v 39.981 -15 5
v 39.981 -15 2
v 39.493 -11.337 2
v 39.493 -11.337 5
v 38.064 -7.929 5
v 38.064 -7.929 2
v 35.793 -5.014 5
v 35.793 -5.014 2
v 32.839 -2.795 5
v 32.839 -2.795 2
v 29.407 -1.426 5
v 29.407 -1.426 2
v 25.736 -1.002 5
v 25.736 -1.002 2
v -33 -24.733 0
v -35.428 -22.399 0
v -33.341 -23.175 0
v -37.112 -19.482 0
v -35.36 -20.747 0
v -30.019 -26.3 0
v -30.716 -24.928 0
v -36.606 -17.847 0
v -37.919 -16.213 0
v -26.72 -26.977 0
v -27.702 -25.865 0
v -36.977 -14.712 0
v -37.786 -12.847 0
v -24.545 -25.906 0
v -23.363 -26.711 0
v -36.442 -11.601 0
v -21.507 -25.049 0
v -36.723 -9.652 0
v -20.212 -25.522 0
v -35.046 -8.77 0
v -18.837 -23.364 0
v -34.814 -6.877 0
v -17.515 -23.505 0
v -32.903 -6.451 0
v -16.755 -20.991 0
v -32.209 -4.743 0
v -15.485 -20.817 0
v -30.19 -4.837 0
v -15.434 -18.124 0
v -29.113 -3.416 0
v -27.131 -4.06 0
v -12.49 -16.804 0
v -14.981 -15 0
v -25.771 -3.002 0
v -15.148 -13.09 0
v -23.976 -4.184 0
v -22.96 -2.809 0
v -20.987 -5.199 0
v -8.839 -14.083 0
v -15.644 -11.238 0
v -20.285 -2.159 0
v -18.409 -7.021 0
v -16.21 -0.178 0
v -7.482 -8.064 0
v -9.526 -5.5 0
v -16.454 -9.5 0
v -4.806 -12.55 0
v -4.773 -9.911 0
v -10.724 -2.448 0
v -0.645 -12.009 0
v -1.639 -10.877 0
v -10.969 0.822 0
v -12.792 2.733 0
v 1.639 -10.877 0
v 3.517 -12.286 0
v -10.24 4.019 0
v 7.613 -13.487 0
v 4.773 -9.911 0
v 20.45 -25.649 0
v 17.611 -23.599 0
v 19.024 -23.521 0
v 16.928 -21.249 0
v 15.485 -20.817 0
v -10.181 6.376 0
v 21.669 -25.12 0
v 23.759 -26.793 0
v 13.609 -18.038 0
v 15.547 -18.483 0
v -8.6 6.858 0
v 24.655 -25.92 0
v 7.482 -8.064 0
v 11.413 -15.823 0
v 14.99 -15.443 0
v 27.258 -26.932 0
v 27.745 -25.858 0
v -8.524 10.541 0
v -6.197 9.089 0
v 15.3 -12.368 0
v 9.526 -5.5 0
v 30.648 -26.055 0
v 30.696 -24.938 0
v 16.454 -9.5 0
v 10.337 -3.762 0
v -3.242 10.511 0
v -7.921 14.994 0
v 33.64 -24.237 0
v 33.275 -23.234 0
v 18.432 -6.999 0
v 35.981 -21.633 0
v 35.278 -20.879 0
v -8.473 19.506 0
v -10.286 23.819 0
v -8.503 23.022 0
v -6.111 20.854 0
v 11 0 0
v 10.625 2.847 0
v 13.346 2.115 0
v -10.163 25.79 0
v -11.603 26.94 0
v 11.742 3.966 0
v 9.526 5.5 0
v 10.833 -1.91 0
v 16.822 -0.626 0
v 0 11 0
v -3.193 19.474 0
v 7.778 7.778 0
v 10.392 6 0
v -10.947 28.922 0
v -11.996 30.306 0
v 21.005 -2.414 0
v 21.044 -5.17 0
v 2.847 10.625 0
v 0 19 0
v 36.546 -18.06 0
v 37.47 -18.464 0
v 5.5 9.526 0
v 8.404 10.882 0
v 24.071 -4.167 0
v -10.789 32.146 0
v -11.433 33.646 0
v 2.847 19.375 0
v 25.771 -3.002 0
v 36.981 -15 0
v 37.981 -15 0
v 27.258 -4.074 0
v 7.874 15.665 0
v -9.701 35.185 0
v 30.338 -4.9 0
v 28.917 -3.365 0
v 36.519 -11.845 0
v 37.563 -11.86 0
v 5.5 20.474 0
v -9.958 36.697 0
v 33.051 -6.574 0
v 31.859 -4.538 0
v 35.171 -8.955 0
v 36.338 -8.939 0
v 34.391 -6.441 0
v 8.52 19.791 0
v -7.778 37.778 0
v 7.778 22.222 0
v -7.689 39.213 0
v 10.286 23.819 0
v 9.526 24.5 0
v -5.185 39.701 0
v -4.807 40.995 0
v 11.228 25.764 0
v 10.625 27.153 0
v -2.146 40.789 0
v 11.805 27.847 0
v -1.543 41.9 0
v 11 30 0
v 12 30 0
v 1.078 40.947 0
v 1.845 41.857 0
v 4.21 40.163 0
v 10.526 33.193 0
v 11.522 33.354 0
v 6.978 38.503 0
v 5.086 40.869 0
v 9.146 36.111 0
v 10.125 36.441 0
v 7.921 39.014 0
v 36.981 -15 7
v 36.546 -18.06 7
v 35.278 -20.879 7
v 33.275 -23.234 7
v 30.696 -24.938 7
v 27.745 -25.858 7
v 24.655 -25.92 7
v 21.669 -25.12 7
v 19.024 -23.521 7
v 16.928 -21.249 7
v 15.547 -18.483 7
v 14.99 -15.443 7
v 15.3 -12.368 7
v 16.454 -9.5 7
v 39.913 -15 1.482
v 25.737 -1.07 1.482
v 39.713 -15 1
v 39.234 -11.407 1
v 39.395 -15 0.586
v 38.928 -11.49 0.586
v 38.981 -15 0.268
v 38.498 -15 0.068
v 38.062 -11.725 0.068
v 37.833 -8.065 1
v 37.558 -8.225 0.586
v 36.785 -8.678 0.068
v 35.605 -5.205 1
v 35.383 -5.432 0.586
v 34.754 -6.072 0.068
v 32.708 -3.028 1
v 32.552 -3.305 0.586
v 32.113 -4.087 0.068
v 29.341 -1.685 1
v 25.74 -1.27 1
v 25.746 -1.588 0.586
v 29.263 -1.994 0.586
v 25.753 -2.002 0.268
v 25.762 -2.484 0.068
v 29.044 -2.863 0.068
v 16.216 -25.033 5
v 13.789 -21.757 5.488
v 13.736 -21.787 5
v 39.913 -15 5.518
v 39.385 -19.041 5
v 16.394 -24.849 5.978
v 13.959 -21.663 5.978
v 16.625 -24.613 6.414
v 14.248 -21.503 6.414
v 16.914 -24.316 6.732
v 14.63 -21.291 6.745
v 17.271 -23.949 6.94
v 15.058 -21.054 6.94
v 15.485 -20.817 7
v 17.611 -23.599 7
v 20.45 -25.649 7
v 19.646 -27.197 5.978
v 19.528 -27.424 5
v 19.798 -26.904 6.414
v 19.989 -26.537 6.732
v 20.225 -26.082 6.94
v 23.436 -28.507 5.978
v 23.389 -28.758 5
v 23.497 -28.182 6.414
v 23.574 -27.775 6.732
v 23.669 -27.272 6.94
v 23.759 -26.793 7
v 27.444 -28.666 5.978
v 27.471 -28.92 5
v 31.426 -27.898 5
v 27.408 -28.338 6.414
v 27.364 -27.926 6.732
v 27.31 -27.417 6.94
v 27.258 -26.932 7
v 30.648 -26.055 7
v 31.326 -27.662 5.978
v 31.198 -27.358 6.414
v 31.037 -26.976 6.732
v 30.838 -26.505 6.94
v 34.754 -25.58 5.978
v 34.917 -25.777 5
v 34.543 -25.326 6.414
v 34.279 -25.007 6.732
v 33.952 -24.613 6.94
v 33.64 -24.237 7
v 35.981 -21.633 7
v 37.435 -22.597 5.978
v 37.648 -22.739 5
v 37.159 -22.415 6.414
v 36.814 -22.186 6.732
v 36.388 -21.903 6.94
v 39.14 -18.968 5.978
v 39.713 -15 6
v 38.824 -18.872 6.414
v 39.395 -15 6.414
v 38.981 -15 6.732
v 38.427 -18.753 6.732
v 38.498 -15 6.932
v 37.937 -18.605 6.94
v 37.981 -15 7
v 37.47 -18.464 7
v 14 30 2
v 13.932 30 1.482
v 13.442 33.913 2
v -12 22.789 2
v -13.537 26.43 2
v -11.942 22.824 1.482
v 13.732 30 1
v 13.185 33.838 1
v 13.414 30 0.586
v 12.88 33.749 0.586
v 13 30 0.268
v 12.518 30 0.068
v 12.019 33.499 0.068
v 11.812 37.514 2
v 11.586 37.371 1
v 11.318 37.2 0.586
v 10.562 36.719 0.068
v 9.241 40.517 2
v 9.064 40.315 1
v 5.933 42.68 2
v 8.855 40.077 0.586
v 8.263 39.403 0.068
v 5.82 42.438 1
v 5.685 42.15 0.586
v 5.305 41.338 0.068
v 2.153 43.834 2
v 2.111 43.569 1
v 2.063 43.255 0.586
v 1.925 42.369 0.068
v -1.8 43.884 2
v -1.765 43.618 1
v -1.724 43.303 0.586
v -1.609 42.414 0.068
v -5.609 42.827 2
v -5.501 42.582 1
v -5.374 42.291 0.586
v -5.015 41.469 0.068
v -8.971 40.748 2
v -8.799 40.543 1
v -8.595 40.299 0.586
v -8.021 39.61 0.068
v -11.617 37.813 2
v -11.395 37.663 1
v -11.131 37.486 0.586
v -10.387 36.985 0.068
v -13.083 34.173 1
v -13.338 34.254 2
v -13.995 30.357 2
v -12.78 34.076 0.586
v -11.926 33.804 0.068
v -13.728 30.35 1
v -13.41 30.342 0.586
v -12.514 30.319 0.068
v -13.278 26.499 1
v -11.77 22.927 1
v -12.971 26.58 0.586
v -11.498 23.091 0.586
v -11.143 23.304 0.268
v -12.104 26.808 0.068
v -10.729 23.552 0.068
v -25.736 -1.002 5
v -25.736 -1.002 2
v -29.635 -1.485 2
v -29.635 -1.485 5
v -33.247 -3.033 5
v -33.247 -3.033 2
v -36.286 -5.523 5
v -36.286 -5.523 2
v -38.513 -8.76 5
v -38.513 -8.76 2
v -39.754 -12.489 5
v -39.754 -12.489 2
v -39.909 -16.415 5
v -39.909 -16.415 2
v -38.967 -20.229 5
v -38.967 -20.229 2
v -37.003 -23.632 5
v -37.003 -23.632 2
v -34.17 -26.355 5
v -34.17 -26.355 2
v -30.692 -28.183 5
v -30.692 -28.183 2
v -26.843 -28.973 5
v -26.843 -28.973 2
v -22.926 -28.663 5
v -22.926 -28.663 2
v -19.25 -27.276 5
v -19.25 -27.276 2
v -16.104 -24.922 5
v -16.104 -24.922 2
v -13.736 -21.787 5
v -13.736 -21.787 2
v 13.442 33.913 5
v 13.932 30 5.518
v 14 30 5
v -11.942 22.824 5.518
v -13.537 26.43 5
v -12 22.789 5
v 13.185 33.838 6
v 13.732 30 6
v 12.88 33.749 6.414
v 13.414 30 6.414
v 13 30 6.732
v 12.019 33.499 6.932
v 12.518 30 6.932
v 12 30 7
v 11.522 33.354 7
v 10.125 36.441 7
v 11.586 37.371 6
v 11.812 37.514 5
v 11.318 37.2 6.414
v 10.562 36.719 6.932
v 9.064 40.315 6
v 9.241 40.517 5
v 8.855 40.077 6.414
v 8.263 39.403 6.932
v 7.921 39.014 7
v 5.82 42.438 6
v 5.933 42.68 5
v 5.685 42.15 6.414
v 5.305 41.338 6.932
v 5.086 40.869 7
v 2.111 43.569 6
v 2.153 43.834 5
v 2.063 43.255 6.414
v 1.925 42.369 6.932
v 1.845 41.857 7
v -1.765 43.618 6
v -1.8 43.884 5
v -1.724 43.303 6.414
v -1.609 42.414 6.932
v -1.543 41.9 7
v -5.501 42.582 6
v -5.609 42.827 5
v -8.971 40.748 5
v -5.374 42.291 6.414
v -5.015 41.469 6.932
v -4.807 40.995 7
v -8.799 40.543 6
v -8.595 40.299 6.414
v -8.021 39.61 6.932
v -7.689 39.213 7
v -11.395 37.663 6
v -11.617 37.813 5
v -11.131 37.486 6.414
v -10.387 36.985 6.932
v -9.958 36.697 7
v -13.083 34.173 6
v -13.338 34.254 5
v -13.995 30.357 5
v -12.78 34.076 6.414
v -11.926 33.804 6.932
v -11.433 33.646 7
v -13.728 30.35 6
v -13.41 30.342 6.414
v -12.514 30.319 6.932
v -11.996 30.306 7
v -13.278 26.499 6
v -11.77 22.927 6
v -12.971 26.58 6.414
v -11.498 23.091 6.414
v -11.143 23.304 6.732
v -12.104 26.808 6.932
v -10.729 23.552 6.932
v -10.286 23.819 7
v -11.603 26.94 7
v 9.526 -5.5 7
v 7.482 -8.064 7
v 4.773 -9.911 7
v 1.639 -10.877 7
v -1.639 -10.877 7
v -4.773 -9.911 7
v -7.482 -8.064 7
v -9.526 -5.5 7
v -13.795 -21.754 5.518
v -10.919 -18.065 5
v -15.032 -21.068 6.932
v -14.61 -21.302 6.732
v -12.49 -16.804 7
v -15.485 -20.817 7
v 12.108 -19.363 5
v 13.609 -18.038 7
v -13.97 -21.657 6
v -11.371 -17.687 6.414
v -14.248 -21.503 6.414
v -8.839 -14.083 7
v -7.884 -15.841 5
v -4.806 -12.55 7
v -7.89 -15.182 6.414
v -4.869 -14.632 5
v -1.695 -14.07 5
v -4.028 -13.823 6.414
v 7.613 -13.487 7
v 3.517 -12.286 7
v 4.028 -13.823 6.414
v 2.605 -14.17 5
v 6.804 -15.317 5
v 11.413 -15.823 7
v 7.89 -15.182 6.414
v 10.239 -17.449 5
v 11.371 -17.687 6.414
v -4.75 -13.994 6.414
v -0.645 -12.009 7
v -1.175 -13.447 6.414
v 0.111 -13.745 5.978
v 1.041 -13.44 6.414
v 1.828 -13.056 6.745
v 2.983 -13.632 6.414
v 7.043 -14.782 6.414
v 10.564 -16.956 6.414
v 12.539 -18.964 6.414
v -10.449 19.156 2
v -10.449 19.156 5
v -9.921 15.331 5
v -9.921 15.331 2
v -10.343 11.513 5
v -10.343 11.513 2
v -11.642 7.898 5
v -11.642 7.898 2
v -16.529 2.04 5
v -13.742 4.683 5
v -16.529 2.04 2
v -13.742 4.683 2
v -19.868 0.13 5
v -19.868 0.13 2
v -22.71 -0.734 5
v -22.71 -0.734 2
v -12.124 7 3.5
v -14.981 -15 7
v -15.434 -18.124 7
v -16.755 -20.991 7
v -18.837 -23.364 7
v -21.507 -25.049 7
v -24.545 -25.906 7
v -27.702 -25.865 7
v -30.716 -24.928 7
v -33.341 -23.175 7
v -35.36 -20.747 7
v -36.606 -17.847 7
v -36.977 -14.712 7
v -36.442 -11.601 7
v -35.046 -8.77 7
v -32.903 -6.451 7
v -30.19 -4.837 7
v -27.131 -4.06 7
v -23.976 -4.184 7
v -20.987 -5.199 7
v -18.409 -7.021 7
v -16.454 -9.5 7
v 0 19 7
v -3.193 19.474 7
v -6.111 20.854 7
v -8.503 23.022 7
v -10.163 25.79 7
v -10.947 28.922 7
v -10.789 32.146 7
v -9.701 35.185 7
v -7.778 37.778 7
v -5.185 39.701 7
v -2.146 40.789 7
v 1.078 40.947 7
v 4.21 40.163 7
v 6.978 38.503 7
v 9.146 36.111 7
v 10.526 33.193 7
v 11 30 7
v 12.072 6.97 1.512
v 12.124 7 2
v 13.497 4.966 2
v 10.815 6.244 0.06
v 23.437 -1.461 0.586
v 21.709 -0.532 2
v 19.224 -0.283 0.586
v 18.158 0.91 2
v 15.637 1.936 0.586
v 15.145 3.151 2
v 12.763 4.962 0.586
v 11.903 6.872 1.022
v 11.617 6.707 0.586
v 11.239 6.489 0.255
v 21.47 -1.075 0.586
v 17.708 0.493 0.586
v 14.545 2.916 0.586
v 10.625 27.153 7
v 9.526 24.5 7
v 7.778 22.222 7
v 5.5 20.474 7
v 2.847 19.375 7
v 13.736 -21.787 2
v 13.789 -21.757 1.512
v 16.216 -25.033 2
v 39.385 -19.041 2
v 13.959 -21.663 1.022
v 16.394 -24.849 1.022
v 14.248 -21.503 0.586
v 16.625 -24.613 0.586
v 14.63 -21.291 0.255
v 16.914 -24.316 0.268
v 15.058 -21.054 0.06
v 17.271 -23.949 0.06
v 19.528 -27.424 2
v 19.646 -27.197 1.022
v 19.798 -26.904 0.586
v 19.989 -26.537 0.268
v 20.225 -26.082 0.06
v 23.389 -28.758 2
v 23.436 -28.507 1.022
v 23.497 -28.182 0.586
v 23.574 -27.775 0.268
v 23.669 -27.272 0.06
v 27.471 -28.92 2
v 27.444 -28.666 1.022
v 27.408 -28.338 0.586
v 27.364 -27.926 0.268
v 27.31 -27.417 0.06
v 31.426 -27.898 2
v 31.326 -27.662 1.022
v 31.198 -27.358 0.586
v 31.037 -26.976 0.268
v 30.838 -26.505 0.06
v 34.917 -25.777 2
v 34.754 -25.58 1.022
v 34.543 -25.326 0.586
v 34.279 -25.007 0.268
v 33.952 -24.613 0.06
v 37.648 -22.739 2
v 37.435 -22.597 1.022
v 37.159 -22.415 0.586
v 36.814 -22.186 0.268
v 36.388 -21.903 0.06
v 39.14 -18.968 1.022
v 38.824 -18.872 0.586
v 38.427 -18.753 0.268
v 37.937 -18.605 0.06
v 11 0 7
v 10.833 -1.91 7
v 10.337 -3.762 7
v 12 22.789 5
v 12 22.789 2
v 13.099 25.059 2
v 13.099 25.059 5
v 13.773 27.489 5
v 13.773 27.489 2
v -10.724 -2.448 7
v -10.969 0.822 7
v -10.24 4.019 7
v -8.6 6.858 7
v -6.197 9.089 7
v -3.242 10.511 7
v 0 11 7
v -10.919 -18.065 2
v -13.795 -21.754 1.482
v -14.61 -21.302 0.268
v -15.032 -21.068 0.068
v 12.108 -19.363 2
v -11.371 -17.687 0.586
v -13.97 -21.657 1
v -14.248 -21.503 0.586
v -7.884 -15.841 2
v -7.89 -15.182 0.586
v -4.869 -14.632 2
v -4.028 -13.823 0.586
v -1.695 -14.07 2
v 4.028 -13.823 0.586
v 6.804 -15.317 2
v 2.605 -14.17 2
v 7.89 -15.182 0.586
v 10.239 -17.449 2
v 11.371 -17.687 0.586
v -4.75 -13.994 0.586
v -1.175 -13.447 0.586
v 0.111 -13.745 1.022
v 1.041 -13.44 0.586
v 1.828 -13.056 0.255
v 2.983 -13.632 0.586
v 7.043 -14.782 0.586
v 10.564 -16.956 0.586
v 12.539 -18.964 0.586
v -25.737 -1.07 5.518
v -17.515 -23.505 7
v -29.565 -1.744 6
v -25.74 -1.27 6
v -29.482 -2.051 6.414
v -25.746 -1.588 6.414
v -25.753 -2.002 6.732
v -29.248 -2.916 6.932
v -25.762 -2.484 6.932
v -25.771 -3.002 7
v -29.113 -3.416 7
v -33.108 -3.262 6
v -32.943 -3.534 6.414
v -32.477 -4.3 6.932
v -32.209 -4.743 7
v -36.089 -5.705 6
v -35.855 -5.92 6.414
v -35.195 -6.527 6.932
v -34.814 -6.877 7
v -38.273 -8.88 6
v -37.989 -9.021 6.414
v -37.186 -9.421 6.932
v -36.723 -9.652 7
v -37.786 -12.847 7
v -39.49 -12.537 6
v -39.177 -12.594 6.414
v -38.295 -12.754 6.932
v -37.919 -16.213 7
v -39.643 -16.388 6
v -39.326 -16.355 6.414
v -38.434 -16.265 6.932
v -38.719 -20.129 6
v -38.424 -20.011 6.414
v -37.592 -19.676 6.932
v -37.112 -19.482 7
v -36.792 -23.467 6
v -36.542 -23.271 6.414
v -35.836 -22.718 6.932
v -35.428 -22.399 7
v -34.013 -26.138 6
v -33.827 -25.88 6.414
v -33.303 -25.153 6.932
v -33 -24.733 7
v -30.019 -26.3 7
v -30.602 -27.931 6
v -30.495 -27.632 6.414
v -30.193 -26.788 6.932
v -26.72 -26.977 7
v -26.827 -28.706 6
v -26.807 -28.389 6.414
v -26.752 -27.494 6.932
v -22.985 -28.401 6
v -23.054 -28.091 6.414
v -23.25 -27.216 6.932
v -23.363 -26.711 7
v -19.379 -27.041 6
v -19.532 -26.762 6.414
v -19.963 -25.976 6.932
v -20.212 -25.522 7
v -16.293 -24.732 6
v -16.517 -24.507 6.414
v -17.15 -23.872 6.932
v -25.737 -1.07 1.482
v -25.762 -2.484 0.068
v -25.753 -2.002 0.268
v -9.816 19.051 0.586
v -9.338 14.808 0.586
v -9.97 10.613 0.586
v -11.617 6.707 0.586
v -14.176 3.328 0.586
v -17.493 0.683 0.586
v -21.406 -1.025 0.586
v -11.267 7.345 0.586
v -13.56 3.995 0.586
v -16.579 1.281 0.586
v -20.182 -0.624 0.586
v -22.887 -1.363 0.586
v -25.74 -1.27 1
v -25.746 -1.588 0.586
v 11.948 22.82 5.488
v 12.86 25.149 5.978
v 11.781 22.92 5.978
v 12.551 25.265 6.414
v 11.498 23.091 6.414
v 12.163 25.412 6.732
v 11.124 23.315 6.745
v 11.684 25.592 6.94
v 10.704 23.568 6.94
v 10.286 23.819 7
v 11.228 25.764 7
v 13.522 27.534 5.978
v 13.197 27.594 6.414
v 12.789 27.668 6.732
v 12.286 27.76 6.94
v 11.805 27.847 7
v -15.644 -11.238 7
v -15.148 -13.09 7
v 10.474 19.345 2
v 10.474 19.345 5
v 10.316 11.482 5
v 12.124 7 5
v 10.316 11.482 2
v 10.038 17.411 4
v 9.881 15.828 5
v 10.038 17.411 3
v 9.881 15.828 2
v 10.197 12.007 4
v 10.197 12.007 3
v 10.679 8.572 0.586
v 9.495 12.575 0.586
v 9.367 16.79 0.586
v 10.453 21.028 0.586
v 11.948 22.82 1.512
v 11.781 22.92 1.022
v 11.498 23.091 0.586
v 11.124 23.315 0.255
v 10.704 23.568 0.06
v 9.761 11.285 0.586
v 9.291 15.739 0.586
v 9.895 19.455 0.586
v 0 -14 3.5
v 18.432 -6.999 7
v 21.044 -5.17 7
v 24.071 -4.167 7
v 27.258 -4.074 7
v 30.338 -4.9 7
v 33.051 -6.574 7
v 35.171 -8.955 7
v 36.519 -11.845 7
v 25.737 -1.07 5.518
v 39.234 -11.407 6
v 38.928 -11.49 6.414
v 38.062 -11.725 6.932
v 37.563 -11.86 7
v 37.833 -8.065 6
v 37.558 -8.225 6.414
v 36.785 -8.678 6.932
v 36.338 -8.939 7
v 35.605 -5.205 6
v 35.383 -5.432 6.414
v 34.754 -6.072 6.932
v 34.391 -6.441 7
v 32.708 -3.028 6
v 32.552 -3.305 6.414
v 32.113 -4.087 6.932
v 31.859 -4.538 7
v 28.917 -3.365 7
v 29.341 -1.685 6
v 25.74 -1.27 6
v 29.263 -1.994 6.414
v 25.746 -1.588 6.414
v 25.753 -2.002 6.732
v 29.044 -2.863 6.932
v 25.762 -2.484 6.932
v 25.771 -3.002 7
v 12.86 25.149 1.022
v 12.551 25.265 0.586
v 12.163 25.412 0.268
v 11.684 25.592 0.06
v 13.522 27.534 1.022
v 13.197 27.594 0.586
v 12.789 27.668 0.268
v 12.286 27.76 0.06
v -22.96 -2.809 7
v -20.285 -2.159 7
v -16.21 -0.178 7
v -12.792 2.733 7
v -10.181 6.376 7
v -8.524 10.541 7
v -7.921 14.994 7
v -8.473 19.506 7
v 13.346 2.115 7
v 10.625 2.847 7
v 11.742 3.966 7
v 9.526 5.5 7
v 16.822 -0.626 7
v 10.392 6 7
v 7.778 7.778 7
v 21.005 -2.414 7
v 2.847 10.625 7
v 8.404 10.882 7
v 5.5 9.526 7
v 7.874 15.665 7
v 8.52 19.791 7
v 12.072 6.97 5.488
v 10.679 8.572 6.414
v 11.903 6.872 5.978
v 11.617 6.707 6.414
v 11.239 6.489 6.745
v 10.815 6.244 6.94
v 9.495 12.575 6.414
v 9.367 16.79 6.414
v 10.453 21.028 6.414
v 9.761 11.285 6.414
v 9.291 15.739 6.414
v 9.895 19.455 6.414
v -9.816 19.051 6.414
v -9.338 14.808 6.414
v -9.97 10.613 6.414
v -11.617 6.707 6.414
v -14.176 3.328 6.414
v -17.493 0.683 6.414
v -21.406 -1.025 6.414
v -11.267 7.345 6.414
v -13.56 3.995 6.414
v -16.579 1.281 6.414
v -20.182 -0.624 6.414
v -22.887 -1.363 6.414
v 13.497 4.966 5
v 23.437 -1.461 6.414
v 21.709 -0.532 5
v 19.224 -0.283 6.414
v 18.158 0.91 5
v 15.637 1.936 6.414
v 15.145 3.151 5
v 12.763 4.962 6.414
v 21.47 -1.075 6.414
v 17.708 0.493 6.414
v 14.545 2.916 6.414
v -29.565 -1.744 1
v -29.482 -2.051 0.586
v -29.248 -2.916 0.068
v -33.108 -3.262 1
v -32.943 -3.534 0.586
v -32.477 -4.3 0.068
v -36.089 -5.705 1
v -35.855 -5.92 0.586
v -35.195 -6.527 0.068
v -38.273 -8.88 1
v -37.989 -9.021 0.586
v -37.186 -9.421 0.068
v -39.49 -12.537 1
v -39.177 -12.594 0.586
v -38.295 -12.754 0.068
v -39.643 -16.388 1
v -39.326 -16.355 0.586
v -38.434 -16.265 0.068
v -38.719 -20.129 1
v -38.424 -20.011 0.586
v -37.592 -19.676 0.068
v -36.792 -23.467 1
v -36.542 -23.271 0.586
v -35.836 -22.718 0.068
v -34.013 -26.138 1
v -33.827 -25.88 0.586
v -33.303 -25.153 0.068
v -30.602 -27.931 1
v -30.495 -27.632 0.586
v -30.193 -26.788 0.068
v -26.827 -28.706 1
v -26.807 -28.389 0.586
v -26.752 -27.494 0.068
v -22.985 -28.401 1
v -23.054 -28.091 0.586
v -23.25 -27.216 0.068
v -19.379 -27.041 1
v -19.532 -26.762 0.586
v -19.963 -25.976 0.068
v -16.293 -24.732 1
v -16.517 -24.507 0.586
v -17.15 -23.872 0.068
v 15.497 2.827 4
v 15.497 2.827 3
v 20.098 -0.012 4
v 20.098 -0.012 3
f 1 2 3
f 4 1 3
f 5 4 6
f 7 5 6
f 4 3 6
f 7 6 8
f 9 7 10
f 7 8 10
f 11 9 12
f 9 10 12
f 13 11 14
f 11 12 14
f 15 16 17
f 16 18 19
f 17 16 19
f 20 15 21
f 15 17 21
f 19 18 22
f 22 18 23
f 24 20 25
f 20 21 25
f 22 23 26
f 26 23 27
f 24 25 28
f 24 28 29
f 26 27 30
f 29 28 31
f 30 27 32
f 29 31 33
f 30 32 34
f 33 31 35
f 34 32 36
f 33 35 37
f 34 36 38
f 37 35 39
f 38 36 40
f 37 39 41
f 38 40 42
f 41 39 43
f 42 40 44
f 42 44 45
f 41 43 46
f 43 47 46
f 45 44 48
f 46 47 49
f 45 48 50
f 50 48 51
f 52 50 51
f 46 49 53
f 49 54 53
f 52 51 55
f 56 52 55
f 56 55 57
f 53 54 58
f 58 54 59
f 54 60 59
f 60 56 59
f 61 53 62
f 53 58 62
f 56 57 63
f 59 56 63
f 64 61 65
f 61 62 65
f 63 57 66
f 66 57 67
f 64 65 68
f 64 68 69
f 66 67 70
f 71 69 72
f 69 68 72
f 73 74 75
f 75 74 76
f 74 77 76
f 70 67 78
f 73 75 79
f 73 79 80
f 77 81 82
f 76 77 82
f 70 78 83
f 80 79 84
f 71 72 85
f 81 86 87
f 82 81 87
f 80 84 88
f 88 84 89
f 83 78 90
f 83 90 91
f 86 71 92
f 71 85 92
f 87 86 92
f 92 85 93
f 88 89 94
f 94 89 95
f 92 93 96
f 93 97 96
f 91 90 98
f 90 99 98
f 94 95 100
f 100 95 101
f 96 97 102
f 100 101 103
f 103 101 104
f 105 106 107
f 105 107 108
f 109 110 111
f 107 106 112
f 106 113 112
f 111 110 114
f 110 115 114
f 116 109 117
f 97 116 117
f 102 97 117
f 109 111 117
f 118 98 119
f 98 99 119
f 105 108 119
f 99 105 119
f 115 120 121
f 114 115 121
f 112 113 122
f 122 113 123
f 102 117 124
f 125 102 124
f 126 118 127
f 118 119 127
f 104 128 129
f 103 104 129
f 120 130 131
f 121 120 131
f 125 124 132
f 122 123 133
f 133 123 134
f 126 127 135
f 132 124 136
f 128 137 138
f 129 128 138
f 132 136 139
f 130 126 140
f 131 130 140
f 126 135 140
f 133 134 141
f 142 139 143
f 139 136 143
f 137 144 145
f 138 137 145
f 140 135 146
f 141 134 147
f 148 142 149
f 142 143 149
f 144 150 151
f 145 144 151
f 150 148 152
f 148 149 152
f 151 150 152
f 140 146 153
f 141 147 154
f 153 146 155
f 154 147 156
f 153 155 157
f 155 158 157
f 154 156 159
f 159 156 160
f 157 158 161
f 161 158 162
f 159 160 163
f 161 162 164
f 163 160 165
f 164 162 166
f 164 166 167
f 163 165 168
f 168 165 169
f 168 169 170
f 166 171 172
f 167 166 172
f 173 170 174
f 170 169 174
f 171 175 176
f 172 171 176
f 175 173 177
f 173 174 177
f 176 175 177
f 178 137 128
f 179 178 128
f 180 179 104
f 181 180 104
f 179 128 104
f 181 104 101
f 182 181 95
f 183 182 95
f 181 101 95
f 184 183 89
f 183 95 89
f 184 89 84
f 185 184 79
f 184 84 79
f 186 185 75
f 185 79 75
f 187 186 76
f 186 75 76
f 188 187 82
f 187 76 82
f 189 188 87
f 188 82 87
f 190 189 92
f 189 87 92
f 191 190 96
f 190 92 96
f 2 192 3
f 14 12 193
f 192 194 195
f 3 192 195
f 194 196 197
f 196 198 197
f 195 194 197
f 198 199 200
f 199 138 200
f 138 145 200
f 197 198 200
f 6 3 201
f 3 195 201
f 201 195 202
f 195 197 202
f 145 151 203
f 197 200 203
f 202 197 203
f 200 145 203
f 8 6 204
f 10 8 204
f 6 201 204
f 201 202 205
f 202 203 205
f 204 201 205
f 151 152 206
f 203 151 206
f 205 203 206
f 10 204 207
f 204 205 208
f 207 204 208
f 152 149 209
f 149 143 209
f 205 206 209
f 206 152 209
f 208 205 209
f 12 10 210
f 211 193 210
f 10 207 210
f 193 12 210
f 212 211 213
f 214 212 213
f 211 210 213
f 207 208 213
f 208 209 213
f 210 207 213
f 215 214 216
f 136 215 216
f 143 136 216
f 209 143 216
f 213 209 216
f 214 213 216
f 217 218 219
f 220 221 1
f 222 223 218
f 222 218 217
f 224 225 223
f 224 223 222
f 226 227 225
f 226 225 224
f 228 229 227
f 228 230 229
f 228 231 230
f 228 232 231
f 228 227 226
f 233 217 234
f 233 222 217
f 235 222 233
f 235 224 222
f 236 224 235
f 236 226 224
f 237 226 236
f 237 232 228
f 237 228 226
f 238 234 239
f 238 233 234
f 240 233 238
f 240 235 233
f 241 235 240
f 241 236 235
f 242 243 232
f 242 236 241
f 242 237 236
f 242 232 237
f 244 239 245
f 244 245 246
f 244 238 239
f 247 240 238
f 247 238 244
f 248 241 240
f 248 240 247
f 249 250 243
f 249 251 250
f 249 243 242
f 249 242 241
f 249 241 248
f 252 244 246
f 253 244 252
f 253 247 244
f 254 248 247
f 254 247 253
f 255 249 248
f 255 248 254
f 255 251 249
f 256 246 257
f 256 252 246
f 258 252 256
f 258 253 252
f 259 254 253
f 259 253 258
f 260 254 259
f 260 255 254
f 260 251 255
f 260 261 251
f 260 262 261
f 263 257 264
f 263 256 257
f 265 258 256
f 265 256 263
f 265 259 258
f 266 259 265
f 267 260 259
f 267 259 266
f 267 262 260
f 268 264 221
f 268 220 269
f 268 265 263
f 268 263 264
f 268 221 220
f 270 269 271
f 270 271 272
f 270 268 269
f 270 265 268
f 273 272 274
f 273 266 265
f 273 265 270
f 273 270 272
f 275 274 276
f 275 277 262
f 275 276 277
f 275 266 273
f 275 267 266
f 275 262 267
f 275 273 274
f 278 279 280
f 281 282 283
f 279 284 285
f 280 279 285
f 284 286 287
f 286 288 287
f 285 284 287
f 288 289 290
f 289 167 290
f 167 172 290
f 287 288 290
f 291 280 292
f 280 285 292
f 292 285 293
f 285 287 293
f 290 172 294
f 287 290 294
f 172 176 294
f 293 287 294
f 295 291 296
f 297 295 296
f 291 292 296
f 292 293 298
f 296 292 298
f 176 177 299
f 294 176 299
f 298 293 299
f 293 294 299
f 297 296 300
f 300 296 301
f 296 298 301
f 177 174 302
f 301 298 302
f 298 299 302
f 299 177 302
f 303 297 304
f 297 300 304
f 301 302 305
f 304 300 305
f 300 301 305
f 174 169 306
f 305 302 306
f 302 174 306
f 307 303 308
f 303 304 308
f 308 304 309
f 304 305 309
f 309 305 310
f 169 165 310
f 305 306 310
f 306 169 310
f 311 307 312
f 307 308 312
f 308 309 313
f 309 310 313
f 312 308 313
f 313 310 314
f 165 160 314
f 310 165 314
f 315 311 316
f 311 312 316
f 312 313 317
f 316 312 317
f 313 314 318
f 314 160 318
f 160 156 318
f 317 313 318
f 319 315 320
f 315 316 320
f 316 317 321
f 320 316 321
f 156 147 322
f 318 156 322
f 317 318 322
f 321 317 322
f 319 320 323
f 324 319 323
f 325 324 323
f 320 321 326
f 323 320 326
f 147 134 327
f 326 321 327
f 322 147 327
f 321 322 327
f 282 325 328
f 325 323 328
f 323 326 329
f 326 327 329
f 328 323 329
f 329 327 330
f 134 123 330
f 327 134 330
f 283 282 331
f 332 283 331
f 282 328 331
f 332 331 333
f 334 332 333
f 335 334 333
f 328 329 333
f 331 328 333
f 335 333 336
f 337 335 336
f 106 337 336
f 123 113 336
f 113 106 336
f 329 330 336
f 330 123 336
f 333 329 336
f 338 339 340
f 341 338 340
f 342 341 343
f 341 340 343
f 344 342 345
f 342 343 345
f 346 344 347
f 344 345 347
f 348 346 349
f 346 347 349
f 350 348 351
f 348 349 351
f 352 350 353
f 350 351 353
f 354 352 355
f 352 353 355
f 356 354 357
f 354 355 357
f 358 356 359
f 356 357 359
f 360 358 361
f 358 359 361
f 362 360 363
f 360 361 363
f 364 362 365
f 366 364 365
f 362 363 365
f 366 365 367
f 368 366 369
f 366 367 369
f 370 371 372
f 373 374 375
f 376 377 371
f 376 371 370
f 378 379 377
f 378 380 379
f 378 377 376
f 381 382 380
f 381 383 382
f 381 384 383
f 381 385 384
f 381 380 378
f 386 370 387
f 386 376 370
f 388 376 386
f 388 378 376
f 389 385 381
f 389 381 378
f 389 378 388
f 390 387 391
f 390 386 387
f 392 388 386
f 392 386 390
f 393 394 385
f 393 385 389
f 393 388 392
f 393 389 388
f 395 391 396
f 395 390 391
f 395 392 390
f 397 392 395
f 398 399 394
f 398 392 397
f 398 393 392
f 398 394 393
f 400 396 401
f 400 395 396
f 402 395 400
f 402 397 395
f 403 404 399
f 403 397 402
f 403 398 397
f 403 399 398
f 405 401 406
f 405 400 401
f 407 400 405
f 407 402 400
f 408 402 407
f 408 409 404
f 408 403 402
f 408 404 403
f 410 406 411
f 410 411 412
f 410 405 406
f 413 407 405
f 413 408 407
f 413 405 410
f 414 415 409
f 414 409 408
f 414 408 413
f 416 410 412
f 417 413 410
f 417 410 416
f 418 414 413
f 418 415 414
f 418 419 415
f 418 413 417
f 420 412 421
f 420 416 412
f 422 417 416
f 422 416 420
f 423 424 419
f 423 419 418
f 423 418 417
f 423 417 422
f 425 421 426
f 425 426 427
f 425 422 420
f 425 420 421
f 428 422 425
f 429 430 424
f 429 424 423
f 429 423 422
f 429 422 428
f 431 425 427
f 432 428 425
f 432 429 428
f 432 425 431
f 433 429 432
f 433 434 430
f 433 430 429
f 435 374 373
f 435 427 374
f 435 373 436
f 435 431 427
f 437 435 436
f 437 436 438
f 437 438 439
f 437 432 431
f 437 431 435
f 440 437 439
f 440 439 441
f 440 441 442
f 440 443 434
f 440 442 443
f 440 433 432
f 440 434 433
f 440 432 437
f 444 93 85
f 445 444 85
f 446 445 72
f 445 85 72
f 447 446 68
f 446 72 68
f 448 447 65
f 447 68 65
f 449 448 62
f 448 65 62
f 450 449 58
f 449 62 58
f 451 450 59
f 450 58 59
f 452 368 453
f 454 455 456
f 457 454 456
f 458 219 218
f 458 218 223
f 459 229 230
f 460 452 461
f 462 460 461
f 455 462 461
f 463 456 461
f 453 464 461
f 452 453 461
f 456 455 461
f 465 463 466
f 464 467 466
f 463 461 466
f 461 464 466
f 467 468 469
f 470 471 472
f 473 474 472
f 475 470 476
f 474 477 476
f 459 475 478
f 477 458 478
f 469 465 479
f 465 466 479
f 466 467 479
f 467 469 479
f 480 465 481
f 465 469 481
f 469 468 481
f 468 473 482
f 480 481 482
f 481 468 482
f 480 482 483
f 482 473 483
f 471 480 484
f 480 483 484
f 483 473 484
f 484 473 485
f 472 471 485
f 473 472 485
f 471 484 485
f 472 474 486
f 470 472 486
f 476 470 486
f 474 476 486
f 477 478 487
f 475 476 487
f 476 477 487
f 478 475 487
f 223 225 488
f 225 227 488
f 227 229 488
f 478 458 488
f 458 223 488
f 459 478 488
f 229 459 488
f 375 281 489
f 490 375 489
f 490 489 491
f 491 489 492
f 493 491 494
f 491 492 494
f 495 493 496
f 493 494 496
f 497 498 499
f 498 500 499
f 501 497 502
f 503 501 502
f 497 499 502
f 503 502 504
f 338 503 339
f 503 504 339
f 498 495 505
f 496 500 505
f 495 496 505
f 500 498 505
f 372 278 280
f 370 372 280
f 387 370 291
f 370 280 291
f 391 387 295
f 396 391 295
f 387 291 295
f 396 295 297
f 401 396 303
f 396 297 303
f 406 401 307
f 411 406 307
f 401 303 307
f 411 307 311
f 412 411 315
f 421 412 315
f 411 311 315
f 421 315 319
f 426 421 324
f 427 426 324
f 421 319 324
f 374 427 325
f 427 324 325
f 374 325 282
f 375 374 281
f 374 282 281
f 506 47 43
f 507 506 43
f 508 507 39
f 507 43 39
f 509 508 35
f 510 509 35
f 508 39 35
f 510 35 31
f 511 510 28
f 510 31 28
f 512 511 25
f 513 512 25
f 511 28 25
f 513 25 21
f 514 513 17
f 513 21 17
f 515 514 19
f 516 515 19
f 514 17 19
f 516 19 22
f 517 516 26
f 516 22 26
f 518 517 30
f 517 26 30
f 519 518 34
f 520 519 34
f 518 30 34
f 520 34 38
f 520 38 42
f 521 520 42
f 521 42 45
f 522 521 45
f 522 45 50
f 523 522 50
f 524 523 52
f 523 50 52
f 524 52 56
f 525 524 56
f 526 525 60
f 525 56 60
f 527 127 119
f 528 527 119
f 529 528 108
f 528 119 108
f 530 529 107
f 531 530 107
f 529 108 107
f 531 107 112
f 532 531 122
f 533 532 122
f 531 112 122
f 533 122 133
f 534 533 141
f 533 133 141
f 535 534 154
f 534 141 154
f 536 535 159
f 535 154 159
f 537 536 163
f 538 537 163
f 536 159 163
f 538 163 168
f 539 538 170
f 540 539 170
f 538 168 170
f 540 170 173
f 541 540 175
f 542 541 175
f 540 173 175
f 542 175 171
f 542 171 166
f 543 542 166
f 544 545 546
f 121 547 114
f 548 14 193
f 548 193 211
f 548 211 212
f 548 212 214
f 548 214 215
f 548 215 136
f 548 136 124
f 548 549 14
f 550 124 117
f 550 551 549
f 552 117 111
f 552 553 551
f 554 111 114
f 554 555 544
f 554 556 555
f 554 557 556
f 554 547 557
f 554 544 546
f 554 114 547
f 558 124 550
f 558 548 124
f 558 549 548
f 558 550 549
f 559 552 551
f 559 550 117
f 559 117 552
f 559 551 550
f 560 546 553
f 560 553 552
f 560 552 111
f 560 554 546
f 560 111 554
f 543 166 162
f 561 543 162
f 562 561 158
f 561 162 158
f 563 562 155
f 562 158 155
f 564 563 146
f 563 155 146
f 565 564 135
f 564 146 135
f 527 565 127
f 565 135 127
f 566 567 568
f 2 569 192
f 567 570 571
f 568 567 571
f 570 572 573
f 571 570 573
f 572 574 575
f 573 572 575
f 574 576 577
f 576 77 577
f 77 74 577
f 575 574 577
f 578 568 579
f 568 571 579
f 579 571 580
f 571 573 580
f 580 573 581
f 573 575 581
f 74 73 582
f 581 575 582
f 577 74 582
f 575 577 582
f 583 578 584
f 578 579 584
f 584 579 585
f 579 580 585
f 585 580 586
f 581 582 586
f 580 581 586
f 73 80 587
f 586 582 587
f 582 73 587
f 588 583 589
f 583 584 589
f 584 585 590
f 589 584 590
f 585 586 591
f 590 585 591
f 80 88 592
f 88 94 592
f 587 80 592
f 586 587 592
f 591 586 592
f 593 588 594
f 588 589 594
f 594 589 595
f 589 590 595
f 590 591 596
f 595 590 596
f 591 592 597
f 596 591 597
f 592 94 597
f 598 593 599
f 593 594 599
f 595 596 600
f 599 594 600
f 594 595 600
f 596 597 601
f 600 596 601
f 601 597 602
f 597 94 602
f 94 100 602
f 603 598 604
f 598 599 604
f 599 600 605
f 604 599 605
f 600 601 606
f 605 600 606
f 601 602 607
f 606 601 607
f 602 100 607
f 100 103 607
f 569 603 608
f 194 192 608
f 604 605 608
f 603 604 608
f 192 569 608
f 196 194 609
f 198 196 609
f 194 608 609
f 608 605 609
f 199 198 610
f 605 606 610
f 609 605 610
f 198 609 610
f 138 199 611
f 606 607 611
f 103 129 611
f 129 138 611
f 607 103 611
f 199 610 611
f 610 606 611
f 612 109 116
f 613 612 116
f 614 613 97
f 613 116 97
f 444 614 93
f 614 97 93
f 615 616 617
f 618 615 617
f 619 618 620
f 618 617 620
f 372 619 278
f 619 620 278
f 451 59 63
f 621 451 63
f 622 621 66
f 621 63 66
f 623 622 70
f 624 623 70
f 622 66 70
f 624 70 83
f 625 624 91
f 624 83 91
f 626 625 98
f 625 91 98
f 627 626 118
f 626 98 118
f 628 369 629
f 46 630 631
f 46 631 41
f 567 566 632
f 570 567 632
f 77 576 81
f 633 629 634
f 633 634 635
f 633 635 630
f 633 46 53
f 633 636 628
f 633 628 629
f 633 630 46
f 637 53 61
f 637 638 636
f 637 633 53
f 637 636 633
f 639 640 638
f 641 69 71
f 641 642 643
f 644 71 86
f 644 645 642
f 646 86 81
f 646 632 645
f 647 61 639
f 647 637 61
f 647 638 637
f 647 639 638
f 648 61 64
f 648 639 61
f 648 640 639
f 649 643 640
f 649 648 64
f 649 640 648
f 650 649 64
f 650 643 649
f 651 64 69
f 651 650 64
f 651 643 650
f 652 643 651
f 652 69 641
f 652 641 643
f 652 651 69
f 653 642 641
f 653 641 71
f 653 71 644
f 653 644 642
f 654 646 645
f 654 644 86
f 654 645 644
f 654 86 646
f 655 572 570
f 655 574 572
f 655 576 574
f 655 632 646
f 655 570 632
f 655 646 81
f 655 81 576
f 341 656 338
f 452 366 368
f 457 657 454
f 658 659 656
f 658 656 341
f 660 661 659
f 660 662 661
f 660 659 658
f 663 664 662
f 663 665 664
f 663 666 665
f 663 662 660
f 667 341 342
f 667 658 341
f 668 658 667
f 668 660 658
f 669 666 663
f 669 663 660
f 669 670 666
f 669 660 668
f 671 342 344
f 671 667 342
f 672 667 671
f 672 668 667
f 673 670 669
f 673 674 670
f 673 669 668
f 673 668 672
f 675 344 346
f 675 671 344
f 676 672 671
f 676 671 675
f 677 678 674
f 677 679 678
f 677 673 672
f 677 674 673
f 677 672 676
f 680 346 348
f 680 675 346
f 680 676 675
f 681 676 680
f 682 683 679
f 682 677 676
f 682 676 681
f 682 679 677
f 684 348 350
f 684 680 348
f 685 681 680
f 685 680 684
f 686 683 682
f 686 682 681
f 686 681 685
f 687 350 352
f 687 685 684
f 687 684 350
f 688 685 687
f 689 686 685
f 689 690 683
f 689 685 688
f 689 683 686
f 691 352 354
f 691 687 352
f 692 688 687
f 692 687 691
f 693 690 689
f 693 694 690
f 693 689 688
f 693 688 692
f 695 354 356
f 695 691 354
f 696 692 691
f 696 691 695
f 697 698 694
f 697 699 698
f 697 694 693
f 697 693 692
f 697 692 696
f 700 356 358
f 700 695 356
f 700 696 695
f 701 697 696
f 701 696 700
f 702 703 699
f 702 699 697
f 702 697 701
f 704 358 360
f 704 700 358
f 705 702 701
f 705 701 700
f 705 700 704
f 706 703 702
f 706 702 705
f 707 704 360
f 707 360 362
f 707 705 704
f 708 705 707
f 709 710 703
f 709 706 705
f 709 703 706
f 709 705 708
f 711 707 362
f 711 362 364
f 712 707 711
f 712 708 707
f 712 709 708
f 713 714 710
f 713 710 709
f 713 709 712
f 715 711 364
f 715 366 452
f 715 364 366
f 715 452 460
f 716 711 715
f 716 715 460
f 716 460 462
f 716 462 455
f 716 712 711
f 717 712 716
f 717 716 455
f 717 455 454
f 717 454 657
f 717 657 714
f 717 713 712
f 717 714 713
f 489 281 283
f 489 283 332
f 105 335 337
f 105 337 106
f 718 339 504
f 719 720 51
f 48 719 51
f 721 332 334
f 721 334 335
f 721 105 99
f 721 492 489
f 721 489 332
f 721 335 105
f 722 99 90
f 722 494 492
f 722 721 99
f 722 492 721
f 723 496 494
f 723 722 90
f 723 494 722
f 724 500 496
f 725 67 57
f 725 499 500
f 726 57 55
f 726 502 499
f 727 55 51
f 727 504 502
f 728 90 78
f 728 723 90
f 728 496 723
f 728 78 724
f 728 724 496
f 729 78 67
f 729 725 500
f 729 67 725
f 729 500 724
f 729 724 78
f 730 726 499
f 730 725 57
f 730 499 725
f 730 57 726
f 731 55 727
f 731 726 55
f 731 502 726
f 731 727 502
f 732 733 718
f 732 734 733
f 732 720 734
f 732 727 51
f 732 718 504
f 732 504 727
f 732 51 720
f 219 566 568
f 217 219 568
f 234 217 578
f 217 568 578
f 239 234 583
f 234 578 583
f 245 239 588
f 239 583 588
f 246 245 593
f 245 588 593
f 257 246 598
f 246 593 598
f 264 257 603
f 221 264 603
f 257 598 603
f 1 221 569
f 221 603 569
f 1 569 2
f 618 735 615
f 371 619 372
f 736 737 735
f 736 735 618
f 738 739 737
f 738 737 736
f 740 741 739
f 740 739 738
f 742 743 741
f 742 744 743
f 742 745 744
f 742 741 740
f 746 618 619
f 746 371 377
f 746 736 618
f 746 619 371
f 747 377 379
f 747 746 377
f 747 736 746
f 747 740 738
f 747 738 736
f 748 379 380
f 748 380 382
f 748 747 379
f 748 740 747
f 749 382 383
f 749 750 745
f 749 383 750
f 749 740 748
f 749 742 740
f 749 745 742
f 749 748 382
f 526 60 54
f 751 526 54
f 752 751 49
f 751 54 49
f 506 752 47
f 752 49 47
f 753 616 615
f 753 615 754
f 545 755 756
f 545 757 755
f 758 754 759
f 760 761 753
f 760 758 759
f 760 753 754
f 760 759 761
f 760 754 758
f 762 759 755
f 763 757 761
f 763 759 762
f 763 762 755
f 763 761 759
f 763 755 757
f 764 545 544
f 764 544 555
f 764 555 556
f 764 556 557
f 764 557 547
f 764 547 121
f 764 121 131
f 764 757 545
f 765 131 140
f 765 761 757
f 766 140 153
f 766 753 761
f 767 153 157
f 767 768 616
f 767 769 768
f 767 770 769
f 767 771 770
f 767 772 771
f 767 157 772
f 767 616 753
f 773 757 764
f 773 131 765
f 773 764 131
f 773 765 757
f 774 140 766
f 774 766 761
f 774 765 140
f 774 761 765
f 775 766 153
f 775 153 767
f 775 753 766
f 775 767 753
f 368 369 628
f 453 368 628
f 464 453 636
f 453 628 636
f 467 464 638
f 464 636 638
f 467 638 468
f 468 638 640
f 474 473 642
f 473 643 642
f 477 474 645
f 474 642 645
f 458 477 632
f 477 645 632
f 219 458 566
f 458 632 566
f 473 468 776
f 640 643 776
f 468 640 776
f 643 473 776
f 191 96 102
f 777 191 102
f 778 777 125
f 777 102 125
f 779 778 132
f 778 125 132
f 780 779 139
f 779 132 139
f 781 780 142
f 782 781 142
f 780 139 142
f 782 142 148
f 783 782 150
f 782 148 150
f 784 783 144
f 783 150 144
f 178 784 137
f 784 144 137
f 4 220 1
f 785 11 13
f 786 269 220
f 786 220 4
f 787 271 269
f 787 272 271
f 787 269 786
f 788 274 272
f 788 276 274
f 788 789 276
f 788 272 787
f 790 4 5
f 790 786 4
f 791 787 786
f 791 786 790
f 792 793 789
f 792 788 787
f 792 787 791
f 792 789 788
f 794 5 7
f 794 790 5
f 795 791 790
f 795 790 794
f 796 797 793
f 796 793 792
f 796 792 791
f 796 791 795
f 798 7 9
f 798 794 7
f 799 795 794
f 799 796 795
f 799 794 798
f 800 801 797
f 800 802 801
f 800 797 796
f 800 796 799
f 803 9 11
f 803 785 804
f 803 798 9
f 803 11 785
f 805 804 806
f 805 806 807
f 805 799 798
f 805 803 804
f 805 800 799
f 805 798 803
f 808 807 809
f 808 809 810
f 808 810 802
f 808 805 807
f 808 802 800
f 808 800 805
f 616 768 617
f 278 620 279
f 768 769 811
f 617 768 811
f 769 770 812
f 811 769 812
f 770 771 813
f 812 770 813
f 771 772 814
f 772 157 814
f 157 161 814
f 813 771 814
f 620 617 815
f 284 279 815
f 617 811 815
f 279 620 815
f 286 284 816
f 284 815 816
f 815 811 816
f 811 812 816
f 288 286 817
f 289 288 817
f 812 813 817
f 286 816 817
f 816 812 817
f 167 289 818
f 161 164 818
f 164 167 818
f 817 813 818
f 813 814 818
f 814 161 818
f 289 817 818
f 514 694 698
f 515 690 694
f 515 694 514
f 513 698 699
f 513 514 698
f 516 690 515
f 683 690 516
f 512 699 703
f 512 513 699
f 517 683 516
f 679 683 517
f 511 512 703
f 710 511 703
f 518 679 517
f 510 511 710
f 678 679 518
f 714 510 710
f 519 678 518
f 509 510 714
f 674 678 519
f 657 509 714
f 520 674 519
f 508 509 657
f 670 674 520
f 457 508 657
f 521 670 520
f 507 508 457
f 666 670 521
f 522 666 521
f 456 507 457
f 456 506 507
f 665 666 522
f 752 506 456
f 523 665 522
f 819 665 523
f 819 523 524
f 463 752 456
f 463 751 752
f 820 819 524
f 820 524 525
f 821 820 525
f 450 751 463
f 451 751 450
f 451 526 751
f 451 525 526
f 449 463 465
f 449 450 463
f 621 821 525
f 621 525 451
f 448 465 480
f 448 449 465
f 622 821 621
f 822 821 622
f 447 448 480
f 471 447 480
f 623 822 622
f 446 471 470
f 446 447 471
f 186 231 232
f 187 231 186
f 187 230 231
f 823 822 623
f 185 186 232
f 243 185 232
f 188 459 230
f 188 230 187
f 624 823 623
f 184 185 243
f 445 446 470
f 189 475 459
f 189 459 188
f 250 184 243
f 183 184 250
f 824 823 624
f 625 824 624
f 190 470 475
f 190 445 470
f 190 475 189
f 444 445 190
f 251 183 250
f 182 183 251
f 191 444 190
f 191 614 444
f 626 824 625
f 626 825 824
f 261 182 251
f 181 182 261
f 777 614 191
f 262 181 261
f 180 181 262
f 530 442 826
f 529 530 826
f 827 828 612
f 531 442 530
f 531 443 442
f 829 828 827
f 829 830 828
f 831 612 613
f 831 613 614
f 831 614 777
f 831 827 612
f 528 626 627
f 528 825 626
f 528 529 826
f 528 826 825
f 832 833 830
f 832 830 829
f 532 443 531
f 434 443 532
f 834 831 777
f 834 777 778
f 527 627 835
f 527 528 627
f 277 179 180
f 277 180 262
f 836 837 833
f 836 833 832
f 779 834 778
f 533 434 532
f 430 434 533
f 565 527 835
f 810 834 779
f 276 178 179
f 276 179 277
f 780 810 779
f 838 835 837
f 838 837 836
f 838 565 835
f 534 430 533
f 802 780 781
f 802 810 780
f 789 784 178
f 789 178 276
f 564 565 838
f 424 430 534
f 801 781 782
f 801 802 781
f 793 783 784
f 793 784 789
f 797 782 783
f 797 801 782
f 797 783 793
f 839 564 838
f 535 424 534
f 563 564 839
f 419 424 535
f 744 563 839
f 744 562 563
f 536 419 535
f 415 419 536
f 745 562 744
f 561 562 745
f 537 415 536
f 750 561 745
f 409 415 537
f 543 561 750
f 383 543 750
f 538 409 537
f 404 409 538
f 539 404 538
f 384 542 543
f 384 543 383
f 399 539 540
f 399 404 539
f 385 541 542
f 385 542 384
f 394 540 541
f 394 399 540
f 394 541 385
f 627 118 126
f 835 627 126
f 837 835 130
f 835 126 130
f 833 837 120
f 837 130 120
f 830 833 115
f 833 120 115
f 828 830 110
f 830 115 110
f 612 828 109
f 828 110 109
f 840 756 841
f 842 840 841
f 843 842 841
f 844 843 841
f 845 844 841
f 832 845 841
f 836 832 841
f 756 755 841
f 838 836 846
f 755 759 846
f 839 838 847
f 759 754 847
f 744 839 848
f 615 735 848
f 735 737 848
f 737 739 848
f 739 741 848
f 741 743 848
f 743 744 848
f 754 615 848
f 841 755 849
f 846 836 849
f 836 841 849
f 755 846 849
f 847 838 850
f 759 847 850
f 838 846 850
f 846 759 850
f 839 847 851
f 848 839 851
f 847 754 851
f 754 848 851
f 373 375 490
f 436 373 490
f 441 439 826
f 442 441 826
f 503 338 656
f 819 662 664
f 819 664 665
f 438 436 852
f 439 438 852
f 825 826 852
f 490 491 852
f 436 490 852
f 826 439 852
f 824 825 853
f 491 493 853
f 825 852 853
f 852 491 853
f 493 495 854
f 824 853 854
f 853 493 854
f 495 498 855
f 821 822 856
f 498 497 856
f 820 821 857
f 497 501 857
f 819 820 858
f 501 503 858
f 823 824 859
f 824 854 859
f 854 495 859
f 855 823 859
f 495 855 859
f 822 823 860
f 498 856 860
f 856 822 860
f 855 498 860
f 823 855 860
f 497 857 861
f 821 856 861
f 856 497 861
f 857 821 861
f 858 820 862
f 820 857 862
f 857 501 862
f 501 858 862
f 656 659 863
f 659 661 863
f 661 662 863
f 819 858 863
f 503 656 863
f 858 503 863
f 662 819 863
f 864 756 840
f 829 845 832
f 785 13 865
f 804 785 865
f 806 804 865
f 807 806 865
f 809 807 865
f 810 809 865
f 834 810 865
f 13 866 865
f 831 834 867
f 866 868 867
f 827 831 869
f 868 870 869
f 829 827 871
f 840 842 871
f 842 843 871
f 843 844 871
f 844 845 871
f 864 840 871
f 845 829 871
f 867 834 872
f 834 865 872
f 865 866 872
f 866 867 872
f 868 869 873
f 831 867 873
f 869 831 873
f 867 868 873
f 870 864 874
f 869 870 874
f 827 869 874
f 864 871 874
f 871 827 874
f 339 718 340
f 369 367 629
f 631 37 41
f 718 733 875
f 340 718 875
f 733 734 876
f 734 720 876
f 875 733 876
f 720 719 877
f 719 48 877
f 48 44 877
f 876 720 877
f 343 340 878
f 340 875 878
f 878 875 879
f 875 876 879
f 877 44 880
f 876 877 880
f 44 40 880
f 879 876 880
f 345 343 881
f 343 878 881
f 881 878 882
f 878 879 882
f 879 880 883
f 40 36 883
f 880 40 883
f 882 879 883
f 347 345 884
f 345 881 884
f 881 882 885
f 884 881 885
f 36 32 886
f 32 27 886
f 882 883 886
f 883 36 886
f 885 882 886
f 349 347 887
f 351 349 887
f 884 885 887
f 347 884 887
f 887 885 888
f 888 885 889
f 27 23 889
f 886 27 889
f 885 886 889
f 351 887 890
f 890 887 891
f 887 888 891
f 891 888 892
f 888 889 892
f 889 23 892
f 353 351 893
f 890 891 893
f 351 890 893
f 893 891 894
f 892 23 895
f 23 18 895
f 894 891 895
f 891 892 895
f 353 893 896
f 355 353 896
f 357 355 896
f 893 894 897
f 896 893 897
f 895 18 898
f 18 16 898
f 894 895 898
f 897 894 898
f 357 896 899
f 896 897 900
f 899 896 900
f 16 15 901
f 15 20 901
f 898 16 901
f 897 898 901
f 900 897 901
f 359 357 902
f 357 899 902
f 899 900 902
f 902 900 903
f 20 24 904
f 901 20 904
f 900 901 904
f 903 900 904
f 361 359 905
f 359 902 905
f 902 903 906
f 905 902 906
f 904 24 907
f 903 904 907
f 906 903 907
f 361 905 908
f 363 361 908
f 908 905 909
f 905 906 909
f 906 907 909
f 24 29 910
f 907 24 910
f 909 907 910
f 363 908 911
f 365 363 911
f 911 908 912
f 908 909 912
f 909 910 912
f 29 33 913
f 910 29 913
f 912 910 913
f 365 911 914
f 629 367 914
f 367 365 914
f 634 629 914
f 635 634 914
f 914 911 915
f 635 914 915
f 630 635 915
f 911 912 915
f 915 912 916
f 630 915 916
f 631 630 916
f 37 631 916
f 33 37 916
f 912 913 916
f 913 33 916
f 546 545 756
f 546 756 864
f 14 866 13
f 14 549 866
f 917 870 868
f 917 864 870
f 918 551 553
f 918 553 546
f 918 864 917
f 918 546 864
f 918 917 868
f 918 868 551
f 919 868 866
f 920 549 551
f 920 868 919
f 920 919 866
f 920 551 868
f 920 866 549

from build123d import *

# Parameters (mm, degrees)
F1_DEPTH = 7
F2_R     = 2


with BuildPart() as f1:
    # F0 (on Top) → F1 (new body)
    with BuildSketch(Plane.XY):
        with BuildLine():
            ThreePointArc((-11.9807621135, -15), (-12.4578005455, -11.3765333686), (-13.8564064606, -8))
            ThreePointArc((-13.8564064606, -8), (-18.8749387967, -2.9373603639), (-25.7357641151, -1.0021438791))
            ThreePointArc((-25.7357641151, -1.0021438791), (-38.1051177665, -22), (-13.7357641151, -21.7867535699))
            ThreePointArc((-13.7357641151, -21.7867535699), (-12.4266119746, -18.5049984324), (-11.9807621135, -15))
        make_face()
        with BuildLine():
            ThreePointArc((-14.9807621135, -15), (-36.6059462027, -17.8470094961), (-16.4544826719, -9.5))
            ThreePointArc((-16.4544826719, -9.5), (-15.3555780244, -12.1529905039), (-14.9807621135, -15))
        make_face(mode=Mode.SUBTRACT)
        with BuildLine():
            ThreePointArc((-9.5262794416, -5.5), (-9.5262794416, 5.5), (0, 11))
            Line((0, 11), (0, 14))
            ThreePointArc((0, 14), (-7.0000000057, 12.1243556497), (-12.1243556595, 6.9999999886))
            ThreePointArc((-12.1243556595, 6.9999999886), (-14, -6.6e-09), (-12.124355653, -7))
            Line((-12.124355653, -7), (-9.5262794416, -5.5))
        make_face()
        with BuildLine():
            Line((-13.8564064606, -8), (-12.124355653, -7))
            ThreePointArc((-12.124355653, -7), (-14, -6.6e-09), (-12.1243556595, 6.9999999886))
            add(Edge.make_bspline(
                [(-12.124355653, 7), (-14.8604643909, 2.2609206509), (-19.9785749652, -1.1029092968), (-25.7357641151, -1.0021438791)],
                knots=[0.5, 0.5, 0.5, 0.5, 1, 1, 1, 1], degree=3))
            ThreePointArc((-25.7357641151, -1.0021438791), (-18.8749387967, -2.9373603639), (-13.8564064606, -8))
        make_face()
        with BuildLine():
            Line((12.124355653, -7), (9.5262794416, -5.5))
            ThreePointArc((9.5262794416, -5.5), (0, -11), (-9.5262794416, -5.5))
            Line((-9.5262794416, -5.5), (-12.124355653, -7))
            ThreePointArc((-12.124355653, -7), (-6.9999999959, -12.1243556553), (9.4e-09, -14))
            ThreePointArc((9.4e-09, -14), (7.0000000041, -12.1243556506), (12.124355653, -7))
        make_face()
        with BuildLine():
            ThreePointArc((9.4e-09, -14), (-6.9999999959, -12.1243556553), (-12.124355653, -7))
            Line((-12.124355653, -7), (-13.8564064606, -8))
            ThreePointArc((-13.8564064606, -8), (-12.4578005455, -11.3765333686), (-11.9807621135, -15))
            ThreePointArc((-11.9807621135, -15), (-12.4266119746, -18.5049984324), (-13.7357641151, -21.7867535699))
            add(Edge.make_bspline(
                [(-13.7357641151, -21.7867535699), (-10.4992239257, -15.947226949), (-5.2496119628, -14), (0, -14)],
                knots=[0, 0, 0, 0, 0.5, 0.5, 0.5, 0.5], degree=3))
        make_face()
        with BuildLine():
            Line((13.8564064606, -8), (12.124355653, -7))
            ThreePointArc((12.124355653, -7), (7.0000000041, -12.1243556506), (9.4e-09, -14))
            add(Edge.make_bspline(
                [(0, -14), (5.2496119628, -14), (10.4992239257, -15.947226949), (13.7357641151, -21.7867535699)],
                knots=[0.5, 0.5, 0.5, 0.5, 1, 1, 1, 1], degree=3))
            ThreePointArc((13.7357641151, -21.7867535699), (11.9812980936, -14.8774963108), (13.8564064606, -8))
        make_face()
        with BuildLine():
            ThreePointArc((0, 11), (7.7781745931, 7.7781745931), (11, 0))
            ThreePointArc((11, 0), (10.6251840892, -2.8470094961), (9.5262794416, -5.5))
            Line((9.5262794416, -5.5), (12.124355653, -7))
            ThreePointArc((12.124355653, -7), (13.522961568, -3.6234666314), (14, 0))
            ThreePointArc((14, 0), (13.5229615737, 3.6234666105), (12.1243556746, 6.9999999625))
            ThreePointArc((12.1243556746, 6.9999999625), (7.0000000188, 12.1243556422), (0, 14))
            Line((0, 14), (0, 11))
        make_face()
        with BuildLine():
            ThreePointArc((25.7357641151, -1.0021438791), (18.8749387967, -2.9373603639), (13.8564064606, -8))
            ThreePointArc((13.8564064606, -8), (11.9812980936, -14.8774963108), (13.7357641151, -21.7867535699))
            ThreePointArc((13.7357641151, -21.7867535699), (29.4857605459, -28.5541501389), (39.9807621135, -15))
            ThreePointArc((39.9807621135, -15), (35.7932548657, -5.0142608692), (25.7357641151, -1.0021438791))
        make_face()
        with BuildLine():
            ThreePointArc((36.9807621135, -15), (23.1337526174, -25.6251840892), (16.4544826719, -9.5))
            ThreePointArc((16.4544826719, -9.5), (28.8277716097, -4.3748159108), (36.9807621135, -15))
        make_face(mode=Mode.SUBTRACT)
        with BuildLine():
            ThreePointArc((14, 0), (13.522961568, -3.6234666314), (12.124355653, -7))
            Line((12.124355653, -7), (13.8564064606, -8))
            ThreePointArc((13.8564064606, -8), (18.8749387967, -2.9373603639), (25.7357641151, -1.0021438791))
            add(Edge.make_bspline(
                [(12.124355653, 7), (14.8196855562, 2.3315516644), (19.6421453279, -1.108797669), (25.7357641151, -1.0021438791)],
                knots=[0.5, 0.5, 0.5, 0.5, 1, 1, 1, 1], degree=3))
            ThreePointArc((12.1243556746, 6.9999999625), (13.5229615737, 3.6234666105), (14, 0))
        make_face()
        with BuildLine():
            Line((0, 16), (0, 14))
            ThreePointArc((0, 14), (7.0000000188, 12.1243556422), (12.1243556746, 6.9999999625))
            add(Edge.make_bspline(
                [(12, 22.7888974491), (8.8608257149, 17.5649956733), (9.4290257497, 11.6684483356), (12.124355653, 7)],
                knots=[0, 0, 0, 0, 0.5, 0.5, 0.5, 0.5], degree=3))
            ThreePointArc((12, 22.7888974491), (6.8936407031, 17.8148566748), (0, 16))
        make_face()
        with BuildLine():
            ThreePointArc((-12.1243556595, 6.9999999886), (-7.0000000057, 12.1243556497), (0, 14))
            Line((0, 14), (0, 16))
            ThreePointArc((0, 16), (-6.8936407031, 17.8148566748), (-12, 22.7888974491))
            add(Edge.make_bspline(
                [(-12, 22.7888974491), (-9.0341400135, 17.8534080997), (-9.3882469151, 11.7390793491), (-12.124355653, 7)],
                knots=[0, 0, 0, 0, 0.5, 0.5, 0.5, 0.5], degree=3))
        make_face()
        with BuildLine():
            ThreePointArc((-12, 22.7888974491), (-6.8936407031, 17.8148566748), (0, 16))
            ThreePointArc((0, 16), (6.8936407031, 17.8148566748), (12, 22.7888974491))
            ThreePointArc((12, 22.7888974491), (13.4907375632, 26.2583426132), (14, 30))
            ThreePointArc((14, 30), (-3.7416573868, 43.4907375632), (-12, 22.7888974491))
        make_face()
        with BuildLine():
            ThreePointArc((11, 30), (7.7781745931, 22.2218254069), (0, 19))
            ThreePointArc((0, 19), (-7.7781745931, 37.7781745931), (11, 30))
        make_face(mode=Mode.SUBTRACT)
    extrude(amount=F1_DEPTH)

    # F2
    f2_edges = [f1.edges().sort_by_distance(p)[0] for p in [
        (-38.105118, -22, 0),
        (-38.105118, -22, 7),
    ]]
    fillet(f2_edges, radius=F2_R)


solid = f1.part
